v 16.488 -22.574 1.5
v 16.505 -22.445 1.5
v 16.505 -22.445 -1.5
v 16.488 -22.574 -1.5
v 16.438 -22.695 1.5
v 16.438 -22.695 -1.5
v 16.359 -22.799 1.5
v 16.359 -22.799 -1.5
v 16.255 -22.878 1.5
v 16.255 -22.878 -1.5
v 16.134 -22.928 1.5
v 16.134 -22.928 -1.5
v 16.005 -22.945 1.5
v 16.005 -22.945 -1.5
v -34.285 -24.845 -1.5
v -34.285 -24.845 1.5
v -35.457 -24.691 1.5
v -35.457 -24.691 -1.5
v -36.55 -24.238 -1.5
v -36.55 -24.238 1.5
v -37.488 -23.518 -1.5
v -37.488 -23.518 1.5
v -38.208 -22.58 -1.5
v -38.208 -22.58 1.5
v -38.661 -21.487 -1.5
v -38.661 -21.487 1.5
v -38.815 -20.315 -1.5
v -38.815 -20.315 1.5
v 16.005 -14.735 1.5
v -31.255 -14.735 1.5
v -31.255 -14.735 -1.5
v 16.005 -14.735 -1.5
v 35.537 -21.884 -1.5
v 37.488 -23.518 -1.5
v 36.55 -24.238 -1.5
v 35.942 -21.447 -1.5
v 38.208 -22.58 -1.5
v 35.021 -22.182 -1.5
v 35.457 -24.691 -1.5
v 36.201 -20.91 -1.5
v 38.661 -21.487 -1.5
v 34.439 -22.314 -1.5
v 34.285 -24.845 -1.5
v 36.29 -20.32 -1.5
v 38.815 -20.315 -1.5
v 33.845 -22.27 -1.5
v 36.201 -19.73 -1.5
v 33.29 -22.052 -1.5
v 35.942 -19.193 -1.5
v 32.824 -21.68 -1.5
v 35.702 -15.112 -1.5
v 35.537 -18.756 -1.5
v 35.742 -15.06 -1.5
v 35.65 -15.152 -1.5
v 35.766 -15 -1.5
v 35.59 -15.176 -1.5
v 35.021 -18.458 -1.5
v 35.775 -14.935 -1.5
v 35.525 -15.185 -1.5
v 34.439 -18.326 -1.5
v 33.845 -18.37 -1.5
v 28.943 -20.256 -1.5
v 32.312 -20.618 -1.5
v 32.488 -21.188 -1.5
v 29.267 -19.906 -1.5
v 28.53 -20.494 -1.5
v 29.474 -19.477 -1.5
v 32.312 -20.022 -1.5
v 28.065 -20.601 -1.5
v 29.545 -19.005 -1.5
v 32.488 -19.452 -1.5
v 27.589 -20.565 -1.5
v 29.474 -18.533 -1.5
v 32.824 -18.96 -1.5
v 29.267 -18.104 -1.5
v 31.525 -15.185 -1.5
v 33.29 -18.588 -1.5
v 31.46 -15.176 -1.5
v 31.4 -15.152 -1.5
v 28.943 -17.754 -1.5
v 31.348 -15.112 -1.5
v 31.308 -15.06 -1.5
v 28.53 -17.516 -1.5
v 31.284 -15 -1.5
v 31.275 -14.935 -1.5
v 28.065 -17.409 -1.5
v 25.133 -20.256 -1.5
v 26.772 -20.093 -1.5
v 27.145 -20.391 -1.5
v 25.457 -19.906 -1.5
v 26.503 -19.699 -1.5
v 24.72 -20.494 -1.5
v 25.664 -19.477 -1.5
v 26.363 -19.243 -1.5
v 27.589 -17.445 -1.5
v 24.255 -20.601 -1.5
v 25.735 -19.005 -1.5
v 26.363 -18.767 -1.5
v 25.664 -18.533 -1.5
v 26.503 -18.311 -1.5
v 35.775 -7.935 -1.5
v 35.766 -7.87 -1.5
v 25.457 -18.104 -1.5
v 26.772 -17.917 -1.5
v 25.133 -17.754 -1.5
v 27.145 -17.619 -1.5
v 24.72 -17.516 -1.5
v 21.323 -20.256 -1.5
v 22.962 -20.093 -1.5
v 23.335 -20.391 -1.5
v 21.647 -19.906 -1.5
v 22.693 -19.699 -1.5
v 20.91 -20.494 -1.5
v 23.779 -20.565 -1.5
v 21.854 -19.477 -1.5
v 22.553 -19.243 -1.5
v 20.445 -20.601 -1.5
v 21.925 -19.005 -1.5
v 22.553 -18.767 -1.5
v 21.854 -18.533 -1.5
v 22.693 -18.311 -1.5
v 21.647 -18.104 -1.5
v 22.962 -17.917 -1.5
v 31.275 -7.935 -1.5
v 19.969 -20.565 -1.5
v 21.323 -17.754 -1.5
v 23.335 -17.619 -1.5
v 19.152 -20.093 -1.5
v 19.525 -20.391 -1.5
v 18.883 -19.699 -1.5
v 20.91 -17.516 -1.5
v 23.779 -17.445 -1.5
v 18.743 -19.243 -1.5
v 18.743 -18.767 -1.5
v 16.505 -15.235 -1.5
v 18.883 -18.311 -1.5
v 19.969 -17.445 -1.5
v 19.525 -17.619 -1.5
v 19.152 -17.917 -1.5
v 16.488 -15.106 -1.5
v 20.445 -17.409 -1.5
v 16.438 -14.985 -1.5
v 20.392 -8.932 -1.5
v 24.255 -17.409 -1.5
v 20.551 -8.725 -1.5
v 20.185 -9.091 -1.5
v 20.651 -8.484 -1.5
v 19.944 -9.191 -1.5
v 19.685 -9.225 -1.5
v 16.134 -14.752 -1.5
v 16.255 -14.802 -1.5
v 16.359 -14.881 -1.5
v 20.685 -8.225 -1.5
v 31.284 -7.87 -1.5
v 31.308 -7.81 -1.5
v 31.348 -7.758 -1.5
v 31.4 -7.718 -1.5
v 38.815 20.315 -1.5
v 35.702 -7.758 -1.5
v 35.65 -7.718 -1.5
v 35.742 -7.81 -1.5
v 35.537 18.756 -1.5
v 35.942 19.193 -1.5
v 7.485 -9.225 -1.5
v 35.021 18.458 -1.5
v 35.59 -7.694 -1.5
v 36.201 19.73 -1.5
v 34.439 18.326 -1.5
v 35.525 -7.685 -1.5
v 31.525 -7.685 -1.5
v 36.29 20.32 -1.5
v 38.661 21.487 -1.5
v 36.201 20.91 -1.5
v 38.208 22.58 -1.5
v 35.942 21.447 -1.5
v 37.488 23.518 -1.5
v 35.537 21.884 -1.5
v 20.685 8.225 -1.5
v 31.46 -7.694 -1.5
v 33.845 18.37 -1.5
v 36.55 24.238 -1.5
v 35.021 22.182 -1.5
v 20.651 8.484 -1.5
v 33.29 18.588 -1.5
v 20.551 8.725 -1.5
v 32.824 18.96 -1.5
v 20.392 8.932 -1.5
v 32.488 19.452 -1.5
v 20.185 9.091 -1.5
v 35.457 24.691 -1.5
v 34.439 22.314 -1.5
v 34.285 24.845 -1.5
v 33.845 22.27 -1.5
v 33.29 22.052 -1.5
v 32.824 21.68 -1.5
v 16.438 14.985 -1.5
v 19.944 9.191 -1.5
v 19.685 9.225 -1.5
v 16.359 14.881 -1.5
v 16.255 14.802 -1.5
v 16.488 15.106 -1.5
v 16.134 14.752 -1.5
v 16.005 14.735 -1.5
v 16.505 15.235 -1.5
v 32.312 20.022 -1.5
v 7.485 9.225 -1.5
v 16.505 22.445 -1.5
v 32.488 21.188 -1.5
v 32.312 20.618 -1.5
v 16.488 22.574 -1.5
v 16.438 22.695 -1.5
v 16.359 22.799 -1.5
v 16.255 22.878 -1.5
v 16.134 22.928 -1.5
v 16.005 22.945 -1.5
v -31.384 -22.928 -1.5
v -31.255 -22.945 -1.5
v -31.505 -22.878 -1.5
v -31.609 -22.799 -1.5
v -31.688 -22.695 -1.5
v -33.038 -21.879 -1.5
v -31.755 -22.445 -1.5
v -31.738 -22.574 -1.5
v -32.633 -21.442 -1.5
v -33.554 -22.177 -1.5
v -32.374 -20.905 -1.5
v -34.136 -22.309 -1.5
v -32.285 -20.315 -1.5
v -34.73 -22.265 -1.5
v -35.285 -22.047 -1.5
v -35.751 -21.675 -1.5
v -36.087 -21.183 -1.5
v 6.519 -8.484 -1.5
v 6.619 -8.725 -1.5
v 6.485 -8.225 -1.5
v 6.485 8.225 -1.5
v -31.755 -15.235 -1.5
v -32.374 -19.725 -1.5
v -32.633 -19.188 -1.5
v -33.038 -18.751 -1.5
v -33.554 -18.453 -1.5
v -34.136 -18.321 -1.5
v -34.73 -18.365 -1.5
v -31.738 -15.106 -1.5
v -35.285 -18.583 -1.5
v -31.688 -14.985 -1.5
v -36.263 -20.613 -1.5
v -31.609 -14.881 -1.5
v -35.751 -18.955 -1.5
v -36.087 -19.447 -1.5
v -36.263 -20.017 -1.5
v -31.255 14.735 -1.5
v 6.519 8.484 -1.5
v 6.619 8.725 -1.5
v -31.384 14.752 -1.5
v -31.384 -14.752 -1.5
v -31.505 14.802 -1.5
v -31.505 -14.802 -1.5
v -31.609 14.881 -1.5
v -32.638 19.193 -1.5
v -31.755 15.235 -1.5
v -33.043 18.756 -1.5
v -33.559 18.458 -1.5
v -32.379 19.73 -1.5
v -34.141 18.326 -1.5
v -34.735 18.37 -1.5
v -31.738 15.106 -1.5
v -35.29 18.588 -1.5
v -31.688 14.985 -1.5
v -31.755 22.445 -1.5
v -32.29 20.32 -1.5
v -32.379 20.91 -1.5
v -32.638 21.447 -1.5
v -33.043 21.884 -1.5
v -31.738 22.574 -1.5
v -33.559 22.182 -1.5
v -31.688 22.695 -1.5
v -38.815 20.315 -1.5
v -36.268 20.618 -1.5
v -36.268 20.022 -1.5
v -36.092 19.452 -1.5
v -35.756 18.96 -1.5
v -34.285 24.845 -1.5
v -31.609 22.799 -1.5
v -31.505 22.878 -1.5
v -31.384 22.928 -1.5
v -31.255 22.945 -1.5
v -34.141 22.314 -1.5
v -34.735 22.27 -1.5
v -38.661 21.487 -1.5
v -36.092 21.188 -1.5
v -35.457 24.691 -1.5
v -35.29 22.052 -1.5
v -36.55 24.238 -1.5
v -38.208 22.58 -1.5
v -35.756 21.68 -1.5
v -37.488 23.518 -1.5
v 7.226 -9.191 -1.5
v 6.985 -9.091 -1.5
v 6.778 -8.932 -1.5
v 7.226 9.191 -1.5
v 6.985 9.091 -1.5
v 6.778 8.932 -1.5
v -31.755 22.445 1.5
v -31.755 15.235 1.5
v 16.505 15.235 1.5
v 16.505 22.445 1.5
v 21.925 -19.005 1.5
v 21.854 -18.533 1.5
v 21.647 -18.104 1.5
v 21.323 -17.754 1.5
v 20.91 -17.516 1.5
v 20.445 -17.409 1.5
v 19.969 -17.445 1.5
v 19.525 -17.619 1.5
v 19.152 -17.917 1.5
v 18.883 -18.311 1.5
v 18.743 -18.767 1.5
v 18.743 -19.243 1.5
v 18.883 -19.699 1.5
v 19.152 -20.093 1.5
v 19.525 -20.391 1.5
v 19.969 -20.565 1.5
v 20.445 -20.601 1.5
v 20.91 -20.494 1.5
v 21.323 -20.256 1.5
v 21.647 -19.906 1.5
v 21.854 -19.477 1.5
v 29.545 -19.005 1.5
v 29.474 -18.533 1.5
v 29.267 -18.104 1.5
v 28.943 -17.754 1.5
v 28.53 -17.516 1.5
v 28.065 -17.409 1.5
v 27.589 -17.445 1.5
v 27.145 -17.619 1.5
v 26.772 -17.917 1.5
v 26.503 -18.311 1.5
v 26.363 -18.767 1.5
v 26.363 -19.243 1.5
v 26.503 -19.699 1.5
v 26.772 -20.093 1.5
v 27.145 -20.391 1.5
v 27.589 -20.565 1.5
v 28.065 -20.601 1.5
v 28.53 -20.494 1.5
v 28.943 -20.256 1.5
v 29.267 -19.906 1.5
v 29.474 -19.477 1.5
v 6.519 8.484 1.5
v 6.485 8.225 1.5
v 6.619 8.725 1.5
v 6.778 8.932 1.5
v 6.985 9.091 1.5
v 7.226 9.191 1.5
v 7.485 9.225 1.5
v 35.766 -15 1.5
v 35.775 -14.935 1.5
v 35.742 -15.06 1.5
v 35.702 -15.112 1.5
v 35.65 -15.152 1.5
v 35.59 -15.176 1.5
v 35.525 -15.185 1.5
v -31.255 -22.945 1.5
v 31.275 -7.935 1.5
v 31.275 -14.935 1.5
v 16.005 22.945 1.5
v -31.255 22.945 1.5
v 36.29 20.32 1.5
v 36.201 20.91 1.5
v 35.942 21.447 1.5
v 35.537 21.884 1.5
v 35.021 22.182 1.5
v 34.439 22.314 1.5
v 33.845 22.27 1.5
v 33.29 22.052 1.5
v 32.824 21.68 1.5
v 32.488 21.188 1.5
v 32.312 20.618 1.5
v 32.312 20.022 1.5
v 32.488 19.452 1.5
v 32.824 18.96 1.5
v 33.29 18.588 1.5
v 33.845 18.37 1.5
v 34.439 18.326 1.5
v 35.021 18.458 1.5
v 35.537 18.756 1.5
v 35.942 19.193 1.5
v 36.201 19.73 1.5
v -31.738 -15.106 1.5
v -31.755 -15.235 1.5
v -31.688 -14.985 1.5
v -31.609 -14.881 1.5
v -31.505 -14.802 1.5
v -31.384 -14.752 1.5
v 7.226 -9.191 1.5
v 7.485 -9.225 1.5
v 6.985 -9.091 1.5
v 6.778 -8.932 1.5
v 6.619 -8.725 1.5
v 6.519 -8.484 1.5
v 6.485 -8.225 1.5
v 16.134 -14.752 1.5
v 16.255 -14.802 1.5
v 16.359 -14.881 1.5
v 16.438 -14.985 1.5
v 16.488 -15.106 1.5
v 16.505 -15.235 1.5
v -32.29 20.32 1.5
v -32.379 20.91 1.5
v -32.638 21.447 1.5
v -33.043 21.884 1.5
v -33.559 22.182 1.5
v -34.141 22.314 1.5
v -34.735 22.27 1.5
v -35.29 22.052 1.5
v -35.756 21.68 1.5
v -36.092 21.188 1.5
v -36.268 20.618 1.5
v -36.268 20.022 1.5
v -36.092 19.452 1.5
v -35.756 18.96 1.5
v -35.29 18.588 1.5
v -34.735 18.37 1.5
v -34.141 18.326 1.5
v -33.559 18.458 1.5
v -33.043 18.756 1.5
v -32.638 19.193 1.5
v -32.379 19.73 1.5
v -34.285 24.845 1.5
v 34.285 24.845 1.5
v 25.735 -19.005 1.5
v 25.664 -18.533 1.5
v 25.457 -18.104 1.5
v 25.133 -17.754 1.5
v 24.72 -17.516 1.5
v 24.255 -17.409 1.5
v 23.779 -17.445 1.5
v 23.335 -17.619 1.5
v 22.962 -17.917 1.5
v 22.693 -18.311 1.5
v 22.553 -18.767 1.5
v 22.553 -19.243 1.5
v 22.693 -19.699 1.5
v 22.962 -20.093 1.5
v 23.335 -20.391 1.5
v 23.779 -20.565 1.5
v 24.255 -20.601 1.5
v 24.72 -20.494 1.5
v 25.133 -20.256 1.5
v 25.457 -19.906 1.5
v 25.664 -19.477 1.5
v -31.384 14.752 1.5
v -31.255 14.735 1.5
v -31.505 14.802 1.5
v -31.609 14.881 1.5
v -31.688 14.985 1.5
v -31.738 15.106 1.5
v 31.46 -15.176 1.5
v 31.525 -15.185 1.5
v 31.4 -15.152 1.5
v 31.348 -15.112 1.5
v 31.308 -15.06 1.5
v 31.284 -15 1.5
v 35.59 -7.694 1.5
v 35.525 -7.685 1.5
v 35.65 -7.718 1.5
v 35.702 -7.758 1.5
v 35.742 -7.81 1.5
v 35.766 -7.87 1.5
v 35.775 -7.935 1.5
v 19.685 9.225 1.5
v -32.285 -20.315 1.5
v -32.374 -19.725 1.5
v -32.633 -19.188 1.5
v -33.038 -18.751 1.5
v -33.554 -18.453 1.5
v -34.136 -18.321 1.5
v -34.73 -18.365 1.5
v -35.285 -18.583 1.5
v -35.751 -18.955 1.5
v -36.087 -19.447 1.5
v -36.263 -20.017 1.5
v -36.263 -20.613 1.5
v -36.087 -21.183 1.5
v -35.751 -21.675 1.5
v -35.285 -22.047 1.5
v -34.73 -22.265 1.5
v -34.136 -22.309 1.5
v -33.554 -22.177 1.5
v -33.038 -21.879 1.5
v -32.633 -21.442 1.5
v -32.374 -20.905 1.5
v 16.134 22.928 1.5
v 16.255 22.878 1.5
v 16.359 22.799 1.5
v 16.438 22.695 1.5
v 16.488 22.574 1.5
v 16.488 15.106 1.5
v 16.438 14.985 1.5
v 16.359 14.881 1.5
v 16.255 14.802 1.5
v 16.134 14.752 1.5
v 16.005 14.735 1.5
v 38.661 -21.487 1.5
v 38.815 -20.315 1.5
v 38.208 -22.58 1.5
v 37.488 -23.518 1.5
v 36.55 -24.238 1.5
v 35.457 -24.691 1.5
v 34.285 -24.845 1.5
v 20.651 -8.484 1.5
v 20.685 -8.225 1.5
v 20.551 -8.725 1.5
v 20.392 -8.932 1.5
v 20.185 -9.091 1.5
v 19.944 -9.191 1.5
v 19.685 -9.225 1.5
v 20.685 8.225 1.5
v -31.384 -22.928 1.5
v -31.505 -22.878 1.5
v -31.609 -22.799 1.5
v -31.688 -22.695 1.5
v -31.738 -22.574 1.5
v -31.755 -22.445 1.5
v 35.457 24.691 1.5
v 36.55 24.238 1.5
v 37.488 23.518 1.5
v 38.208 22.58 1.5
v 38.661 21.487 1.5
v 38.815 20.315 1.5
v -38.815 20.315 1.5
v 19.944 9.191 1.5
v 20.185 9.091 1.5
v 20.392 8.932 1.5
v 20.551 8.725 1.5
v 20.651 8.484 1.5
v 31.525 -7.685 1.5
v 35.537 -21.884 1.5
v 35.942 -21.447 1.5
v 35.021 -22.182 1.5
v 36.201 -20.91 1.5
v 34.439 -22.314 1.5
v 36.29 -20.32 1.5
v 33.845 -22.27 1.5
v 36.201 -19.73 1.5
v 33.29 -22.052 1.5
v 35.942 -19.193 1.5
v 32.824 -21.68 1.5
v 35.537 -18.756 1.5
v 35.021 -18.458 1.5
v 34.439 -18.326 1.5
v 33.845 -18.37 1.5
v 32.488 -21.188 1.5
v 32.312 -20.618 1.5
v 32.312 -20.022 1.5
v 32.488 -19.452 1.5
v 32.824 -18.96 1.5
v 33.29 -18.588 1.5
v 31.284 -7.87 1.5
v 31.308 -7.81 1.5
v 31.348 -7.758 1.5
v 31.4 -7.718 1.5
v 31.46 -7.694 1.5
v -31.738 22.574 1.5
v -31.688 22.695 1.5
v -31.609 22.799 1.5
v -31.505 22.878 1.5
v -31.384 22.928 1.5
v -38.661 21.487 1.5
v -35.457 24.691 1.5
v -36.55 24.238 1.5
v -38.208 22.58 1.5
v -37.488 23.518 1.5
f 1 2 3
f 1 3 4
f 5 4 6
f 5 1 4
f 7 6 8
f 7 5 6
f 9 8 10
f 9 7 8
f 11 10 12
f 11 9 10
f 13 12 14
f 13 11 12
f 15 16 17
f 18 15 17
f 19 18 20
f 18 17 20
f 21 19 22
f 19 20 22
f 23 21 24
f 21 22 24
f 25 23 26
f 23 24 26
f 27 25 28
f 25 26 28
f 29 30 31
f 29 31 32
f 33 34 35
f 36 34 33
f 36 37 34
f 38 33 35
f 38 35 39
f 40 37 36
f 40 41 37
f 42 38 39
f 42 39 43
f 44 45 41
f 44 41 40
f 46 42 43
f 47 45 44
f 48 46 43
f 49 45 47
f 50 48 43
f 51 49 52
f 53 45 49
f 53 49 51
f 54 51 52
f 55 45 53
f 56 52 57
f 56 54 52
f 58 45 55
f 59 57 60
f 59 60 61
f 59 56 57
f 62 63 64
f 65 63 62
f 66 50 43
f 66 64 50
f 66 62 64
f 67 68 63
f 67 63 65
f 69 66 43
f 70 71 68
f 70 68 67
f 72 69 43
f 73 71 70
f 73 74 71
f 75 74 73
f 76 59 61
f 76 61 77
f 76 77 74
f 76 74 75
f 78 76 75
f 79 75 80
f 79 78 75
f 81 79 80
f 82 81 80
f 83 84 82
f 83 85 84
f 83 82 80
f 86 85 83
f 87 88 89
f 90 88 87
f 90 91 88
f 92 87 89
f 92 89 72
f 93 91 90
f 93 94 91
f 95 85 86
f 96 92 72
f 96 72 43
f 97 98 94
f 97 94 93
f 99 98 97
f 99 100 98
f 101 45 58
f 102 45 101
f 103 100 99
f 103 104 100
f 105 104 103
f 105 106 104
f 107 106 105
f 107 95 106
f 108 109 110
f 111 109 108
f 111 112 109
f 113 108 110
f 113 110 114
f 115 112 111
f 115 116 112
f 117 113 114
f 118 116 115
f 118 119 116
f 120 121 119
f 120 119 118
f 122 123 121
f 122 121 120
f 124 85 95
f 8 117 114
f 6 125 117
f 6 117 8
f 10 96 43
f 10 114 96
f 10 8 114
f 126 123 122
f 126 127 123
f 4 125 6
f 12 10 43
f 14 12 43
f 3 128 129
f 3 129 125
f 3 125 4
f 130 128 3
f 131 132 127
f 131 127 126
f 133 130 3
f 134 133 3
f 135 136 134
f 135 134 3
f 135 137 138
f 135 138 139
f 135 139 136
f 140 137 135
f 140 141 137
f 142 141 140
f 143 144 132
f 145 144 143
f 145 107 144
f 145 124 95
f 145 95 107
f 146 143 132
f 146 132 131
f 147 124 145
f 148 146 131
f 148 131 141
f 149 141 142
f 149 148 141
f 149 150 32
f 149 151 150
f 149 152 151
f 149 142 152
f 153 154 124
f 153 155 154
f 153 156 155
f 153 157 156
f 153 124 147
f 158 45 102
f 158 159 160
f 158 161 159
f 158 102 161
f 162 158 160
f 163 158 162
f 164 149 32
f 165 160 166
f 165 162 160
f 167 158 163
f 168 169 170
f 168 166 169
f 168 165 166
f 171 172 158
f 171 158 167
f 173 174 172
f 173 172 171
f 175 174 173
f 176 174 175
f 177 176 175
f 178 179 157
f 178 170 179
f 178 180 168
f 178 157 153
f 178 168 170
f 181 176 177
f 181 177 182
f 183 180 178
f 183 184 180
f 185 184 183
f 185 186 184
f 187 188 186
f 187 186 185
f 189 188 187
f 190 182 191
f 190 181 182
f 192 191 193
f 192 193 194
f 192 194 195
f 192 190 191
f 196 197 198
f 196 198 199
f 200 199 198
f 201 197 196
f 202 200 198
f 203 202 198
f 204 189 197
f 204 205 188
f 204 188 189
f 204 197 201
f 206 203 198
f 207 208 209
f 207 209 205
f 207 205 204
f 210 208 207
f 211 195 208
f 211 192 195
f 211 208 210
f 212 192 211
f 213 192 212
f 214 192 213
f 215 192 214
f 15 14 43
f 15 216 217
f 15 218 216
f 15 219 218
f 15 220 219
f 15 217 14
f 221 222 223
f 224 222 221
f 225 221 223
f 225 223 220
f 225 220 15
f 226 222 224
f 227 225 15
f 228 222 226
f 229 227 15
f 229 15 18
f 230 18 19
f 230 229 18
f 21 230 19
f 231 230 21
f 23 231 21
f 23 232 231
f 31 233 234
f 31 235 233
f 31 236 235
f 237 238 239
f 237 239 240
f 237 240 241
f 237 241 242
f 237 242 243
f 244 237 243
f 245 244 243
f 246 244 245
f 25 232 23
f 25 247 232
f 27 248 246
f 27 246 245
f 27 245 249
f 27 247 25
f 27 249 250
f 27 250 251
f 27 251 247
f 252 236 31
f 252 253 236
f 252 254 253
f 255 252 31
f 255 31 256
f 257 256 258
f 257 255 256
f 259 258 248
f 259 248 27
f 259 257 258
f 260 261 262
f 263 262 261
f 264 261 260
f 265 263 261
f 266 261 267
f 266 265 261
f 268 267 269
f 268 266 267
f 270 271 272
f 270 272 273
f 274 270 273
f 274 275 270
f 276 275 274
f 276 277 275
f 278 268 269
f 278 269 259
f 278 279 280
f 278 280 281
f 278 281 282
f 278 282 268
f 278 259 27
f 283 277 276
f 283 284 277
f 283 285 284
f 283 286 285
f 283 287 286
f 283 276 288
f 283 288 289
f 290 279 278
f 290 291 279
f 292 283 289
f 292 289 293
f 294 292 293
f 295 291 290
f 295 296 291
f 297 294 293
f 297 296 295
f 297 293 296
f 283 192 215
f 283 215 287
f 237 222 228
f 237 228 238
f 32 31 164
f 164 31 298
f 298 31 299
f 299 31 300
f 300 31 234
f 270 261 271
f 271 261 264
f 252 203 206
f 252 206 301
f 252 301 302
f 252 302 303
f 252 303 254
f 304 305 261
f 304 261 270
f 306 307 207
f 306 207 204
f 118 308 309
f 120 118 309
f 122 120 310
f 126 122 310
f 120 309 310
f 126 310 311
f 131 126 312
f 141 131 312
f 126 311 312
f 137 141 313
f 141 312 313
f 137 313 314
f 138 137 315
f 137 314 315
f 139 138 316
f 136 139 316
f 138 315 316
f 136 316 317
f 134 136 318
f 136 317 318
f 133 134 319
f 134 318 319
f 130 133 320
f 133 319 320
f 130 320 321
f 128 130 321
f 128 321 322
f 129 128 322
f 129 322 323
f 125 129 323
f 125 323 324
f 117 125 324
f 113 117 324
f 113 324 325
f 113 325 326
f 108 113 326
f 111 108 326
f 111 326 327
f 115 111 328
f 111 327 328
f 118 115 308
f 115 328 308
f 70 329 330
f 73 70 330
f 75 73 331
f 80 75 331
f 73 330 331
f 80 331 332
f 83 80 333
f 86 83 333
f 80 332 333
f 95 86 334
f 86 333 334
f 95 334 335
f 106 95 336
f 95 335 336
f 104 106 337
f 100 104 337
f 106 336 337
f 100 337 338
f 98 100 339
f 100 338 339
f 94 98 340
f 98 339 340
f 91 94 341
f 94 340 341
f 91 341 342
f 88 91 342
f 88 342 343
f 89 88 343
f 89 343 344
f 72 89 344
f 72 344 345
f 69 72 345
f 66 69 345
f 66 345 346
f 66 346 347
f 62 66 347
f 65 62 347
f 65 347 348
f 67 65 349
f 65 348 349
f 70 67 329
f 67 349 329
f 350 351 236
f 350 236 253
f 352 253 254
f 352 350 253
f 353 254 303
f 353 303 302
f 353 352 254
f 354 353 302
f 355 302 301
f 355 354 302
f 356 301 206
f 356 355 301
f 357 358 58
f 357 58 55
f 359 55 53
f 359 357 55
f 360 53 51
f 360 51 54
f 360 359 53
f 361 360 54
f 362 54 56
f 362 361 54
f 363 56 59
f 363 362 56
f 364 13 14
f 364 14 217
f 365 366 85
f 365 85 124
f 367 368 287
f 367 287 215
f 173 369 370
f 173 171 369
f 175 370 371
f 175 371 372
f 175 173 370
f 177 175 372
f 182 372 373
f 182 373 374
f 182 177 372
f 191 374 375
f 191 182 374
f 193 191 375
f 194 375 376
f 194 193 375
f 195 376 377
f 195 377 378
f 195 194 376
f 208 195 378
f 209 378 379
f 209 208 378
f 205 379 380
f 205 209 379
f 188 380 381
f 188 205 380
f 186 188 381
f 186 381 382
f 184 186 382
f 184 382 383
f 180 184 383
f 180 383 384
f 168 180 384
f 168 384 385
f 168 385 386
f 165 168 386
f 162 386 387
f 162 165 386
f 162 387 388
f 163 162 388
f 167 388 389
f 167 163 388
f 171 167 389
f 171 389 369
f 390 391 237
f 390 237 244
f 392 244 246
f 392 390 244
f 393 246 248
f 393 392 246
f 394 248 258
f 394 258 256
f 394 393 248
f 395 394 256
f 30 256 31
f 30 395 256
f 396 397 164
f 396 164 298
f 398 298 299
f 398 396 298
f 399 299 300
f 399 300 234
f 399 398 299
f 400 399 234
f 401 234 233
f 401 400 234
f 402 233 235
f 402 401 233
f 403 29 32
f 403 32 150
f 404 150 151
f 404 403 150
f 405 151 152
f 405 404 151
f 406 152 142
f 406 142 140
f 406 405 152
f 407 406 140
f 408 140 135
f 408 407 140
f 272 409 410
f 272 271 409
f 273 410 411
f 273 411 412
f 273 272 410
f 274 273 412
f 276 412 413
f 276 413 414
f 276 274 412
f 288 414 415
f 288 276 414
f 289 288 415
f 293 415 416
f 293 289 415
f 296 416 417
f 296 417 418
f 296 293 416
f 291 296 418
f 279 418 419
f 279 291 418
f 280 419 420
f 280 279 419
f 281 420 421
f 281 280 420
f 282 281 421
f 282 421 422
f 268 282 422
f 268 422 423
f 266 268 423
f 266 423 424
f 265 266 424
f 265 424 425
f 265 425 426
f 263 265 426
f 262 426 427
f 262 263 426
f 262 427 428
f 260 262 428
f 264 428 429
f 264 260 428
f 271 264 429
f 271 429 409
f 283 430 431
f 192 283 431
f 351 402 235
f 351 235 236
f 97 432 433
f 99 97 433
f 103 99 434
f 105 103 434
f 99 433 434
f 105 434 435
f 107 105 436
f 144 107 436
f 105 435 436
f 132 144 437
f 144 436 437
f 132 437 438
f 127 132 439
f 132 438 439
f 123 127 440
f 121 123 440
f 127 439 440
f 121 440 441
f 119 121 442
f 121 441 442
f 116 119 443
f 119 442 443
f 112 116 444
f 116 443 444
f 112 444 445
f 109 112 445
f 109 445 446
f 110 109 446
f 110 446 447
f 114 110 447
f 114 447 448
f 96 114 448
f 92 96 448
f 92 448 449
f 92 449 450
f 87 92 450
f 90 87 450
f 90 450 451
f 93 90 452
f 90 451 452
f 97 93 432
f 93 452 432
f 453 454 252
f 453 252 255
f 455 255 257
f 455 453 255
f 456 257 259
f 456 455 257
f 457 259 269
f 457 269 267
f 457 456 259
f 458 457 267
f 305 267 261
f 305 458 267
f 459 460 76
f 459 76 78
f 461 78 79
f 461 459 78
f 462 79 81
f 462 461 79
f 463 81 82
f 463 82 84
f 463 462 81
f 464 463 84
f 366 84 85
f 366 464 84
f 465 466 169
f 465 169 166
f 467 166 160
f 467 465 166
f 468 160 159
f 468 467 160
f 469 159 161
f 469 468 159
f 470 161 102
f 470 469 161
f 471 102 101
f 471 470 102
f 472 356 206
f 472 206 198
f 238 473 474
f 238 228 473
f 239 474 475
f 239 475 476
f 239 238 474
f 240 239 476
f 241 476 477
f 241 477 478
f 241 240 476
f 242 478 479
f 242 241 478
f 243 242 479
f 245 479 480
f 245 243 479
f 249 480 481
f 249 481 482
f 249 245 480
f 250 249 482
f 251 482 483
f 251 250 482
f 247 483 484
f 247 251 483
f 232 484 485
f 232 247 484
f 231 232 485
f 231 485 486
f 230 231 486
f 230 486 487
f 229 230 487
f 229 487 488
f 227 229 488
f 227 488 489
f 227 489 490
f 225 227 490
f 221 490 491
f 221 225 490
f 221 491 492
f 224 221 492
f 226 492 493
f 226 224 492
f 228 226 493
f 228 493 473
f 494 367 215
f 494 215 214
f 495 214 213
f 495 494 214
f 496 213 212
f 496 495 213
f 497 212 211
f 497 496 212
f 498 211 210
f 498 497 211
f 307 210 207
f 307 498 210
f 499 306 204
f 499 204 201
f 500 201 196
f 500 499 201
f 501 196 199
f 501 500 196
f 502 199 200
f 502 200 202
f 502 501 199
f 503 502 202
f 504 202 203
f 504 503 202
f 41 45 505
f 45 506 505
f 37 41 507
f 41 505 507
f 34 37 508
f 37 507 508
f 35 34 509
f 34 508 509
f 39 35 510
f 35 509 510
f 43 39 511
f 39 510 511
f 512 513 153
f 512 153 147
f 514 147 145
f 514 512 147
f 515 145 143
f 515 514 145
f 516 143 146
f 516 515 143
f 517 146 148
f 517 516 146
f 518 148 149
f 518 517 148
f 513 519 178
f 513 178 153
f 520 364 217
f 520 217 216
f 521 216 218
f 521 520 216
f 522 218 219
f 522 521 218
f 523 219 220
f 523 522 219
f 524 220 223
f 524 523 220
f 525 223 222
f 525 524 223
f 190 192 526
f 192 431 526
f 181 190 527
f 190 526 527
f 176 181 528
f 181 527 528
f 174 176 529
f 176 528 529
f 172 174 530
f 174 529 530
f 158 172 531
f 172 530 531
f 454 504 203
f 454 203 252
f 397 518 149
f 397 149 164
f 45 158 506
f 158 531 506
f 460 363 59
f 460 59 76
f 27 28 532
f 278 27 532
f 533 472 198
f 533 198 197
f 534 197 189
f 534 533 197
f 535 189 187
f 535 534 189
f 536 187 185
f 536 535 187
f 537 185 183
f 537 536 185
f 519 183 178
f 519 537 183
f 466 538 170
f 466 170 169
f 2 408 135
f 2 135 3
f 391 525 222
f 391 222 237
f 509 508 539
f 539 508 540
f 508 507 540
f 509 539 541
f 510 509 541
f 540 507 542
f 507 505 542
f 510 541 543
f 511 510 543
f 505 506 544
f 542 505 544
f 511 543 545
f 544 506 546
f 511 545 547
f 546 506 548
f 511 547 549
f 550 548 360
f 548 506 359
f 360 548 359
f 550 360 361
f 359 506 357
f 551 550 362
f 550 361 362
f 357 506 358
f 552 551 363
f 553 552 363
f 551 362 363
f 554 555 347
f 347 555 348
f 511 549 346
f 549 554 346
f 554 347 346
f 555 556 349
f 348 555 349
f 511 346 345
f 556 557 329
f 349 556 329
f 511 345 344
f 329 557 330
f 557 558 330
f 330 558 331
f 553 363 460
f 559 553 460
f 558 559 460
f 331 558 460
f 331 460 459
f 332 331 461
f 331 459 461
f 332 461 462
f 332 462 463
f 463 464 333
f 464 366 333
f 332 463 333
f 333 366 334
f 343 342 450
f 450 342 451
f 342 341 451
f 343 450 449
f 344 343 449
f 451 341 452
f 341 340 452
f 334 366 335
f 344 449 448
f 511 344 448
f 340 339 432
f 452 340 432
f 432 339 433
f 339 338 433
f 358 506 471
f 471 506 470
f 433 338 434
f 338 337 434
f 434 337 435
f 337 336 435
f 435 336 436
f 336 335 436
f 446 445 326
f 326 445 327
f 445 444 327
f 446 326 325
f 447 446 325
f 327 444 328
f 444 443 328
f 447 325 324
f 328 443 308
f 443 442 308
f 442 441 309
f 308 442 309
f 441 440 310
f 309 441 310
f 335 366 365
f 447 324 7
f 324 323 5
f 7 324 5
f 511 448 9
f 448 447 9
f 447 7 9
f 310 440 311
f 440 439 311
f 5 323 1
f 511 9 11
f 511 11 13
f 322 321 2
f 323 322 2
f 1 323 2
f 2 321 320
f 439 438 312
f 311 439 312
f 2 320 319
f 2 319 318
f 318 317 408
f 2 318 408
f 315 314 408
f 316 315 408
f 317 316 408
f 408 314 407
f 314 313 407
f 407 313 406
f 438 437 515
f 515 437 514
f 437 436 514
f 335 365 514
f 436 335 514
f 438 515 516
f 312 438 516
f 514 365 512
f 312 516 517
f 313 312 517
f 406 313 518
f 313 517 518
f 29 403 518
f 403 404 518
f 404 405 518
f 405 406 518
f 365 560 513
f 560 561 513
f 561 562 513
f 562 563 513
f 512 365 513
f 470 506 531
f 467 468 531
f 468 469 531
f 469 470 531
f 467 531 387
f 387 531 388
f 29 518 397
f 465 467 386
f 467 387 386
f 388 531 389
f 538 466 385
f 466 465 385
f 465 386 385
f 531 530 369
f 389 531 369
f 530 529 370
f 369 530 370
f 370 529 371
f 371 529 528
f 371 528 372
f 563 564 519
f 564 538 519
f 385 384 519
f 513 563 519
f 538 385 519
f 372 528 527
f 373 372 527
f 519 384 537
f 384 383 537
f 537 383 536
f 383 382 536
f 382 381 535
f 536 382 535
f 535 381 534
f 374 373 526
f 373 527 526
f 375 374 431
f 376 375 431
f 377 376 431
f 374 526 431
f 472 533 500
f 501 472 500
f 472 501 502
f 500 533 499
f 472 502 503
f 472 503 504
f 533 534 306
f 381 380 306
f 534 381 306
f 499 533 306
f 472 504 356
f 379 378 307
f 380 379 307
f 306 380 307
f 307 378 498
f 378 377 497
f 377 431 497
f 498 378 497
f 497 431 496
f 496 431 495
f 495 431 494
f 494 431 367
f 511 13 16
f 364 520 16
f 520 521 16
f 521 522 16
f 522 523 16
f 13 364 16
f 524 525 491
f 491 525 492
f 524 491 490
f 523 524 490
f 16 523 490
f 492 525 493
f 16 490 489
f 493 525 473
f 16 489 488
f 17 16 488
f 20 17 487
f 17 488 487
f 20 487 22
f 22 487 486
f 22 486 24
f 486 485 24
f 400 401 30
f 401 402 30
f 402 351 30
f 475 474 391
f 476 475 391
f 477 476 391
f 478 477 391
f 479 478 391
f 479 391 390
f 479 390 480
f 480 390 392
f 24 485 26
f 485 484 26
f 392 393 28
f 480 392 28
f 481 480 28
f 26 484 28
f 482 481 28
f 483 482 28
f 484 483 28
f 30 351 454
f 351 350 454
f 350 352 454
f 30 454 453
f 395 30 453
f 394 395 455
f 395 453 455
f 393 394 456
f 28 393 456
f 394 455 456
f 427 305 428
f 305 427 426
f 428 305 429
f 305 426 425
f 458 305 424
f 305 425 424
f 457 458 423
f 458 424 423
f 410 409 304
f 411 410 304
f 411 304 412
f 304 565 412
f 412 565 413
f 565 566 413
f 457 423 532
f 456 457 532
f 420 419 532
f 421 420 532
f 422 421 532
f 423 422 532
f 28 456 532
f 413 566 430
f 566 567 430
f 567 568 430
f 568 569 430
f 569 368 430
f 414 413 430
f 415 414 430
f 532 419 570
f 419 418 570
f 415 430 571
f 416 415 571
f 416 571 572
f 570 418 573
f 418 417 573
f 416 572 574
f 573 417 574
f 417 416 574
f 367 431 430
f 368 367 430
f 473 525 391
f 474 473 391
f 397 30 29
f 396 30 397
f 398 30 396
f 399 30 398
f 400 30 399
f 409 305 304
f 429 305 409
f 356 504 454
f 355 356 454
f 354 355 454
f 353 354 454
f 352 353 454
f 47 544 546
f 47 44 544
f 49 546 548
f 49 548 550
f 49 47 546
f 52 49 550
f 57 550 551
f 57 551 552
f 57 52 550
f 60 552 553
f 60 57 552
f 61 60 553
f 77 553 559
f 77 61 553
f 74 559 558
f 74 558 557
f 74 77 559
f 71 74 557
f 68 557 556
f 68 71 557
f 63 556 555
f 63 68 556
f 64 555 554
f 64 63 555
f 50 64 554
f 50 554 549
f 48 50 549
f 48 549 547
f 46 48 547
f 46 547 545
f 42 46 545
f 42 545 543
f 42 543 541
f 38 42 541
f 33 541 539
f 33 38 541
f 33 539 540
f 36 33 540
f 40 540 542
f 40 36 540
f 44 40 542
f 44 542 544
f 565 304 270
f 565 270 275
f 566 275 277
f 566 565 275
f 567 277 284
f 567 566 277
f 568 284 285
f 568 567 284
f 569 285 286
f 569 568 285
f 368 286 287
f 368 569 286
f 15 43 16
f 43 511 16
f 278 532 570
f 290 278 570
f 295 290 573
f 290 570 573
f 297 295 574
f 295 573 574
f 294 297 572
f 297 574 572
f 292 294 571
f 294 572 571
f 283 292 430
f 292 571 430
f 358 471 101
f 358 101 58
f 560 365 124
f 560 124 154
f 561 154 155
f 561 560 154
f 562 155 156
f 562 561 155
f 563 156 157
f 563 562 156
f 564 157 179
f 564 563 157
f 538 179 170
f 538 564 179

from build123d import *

# Parameters (mm, degrees)
SKETCH_1_R          = 2
EXTRUDE_1_DEPTH     = 1.5
SKETCH_2_R          = 1.6
CUT_EXTRUDE_1_DEPTH = 3


with BuildPart() as part:
    # 草图1 → 凸台-拉伸1 (new, symmetric)
    with BuildSketch(Plane.XY):
        with BuildLine():
            Line((-34.285, 24.845), (34.285, 24.845))
            ThreePointArc((34.285, 24.845), (37.488193719, 23.518193719), (38.815, 20.315))
            Line((38.815, 20.315), (38.815, -20.315))
            ThreePointArc((38.815, -20.315), (37.488193719, -23.518193719), (34.285, -24.845))
            Line((34.285, -24.845), (-34.285, -24.845))
            ThreePointArc((-34.285, -24.845), (-37.488193719, -23.518193719), (-38.815, -20.315))
            Line((-38.815, -20.315), (-38.815, 20.315))
            ThreePointArc((-38.815, 20.315), (-37.488193719, 23.518193719), (-34.285, 24.845))
        make_face()
        with Locations((34.29, 20.32)):
            Circle(SKETCH_1_R, mode=Mode.SUBTRACT)
        with Locations((34.29, -20.32)):
            Circle(SKETCH_1_R, mode=Mode.SUBTRACT)
        with Locations((-34.29, 20.32)):
            Circle(SKETCH_1_R, mode=Mode.SUBTRACT)
        with Locations((-34.285, -20.315)):
            Circle(SKETCH_1_R, mode=Mode.SUBTRACT)
    extrude(amount=EXTRUDE_1_DEPTH, both=True)

    # 草图2 → 切除-拉伸1 (cut)
    with BuildSketch(Plane.XY.offset(1.5)):
        with Locations((27.945, -19.005)):
            Circle(SKETCH_2_R)
        with Locations((24.135, -19.005)):
            Circle(SKETCH_2_R)
        with Locations((20.325, -19.005)):
            Circle(SKETCH_2_R)
        with BuildLine():
            Line((-31.255, 22.945), (16.005, 22.945))
            ThreePointArc((16.005, 22.945), (16.358553391, 22.798553391), (16.505, 22.445))
            Line((16.505, 22.445), (16.505, 15.235))
            ThreePointArc((16.505, 15.235), (16.358553391, 14.881446609), (16.005, 14.735))
            Line((16.005, 14.735), (-31.255, 14.735))
            ThreePointArc((-31.255, 14.735), (-31.608553391, 14.881446609), (-31.755, 15.235))
            Line((-31.755, 15.235), (-31.755, 22.445))
            ThreePointArc((-31.755, 22.445), (-31.608553391, 22.798553391), (-31.255, 22.945))
        make_face()
        with BuildLine():
            Line((-31.755, -22.445), (-31.755, -15.235))
            ThreePointArc((-31.755, -15.235), (-31.608553391, -14.881446609), (-31.255, -14.735))
            Line((-31.255, -14.735), (16.005, -14.735))
            ThreePointArc((16.005, -14.735), (16.358553391, -14.881446609), (16.505, -15.235))
            Line((16.505, -15.235), (16.505, -22.445))
            ThreePointArc((16.505, -22.445), (16.358553391, -22.798553391), (16.005, -22.945))
            Line((16.005, -22.945), (-31.255, -22.945))
            ThreePointArc((-31.255, -22.945), (-31.608553391, -22.798553391), (-31.755, -22.445))
        make_face()
        with BuildLine():
            Line((31.525, -7.685), (35.525, -7.685))
            ThreePointArc((35.525, -7.685), (35.701776695, -7.758223305), (35.775, -7.935))
            Line((35.775, -7.935), (35.775, -14.935))
            ThreePointArc((35.775, -14.935), (35.701776695, -15.111776695), (35.525, -15.185))
            Line((35.525, -15.185), (31.525, -15.185))
            ThreePointArc((31.525, -15.185), (31.348223305, -15.111776695), (31.275, -14.935))
            Line((31.275, -14.935), (31.275, -7.935))
            ThreePointArc((31.275, -7.935), (31.348223305, -7.758223305), (31.525, -7.685))
        make_face()
        with BuildLine():
            Line((7.485, 9.225), (19.685, 9.225))
            ThreePointArc((19.685, 9.225), (20.392106781, 8.932106781), (20.685, 8.225))
            Line((20.685, 8.225), (20.685, -8.225))
            ThreePointArc((20.685, -8.225), (20.392106781, -8.932106781), (19.685, -9.225))
            Line((19.685, -9.225), (7.485, -9.225))
            ThreePointArc((7.485, -9.225), (6.777893219, -8.932106781), (6.485, -8.225))
            Line((6.485, -8.225), (6.485, 8.225))
            ThreePointArc((6.485, 8.225), (6.777893219, 8.932106781), (7.485, 9.225))
        make_face()
    extrude(amount=-CUT_EXTRUDE_1_DEPTH, mode=Mode.SUBTRACT)


solid = part.part
